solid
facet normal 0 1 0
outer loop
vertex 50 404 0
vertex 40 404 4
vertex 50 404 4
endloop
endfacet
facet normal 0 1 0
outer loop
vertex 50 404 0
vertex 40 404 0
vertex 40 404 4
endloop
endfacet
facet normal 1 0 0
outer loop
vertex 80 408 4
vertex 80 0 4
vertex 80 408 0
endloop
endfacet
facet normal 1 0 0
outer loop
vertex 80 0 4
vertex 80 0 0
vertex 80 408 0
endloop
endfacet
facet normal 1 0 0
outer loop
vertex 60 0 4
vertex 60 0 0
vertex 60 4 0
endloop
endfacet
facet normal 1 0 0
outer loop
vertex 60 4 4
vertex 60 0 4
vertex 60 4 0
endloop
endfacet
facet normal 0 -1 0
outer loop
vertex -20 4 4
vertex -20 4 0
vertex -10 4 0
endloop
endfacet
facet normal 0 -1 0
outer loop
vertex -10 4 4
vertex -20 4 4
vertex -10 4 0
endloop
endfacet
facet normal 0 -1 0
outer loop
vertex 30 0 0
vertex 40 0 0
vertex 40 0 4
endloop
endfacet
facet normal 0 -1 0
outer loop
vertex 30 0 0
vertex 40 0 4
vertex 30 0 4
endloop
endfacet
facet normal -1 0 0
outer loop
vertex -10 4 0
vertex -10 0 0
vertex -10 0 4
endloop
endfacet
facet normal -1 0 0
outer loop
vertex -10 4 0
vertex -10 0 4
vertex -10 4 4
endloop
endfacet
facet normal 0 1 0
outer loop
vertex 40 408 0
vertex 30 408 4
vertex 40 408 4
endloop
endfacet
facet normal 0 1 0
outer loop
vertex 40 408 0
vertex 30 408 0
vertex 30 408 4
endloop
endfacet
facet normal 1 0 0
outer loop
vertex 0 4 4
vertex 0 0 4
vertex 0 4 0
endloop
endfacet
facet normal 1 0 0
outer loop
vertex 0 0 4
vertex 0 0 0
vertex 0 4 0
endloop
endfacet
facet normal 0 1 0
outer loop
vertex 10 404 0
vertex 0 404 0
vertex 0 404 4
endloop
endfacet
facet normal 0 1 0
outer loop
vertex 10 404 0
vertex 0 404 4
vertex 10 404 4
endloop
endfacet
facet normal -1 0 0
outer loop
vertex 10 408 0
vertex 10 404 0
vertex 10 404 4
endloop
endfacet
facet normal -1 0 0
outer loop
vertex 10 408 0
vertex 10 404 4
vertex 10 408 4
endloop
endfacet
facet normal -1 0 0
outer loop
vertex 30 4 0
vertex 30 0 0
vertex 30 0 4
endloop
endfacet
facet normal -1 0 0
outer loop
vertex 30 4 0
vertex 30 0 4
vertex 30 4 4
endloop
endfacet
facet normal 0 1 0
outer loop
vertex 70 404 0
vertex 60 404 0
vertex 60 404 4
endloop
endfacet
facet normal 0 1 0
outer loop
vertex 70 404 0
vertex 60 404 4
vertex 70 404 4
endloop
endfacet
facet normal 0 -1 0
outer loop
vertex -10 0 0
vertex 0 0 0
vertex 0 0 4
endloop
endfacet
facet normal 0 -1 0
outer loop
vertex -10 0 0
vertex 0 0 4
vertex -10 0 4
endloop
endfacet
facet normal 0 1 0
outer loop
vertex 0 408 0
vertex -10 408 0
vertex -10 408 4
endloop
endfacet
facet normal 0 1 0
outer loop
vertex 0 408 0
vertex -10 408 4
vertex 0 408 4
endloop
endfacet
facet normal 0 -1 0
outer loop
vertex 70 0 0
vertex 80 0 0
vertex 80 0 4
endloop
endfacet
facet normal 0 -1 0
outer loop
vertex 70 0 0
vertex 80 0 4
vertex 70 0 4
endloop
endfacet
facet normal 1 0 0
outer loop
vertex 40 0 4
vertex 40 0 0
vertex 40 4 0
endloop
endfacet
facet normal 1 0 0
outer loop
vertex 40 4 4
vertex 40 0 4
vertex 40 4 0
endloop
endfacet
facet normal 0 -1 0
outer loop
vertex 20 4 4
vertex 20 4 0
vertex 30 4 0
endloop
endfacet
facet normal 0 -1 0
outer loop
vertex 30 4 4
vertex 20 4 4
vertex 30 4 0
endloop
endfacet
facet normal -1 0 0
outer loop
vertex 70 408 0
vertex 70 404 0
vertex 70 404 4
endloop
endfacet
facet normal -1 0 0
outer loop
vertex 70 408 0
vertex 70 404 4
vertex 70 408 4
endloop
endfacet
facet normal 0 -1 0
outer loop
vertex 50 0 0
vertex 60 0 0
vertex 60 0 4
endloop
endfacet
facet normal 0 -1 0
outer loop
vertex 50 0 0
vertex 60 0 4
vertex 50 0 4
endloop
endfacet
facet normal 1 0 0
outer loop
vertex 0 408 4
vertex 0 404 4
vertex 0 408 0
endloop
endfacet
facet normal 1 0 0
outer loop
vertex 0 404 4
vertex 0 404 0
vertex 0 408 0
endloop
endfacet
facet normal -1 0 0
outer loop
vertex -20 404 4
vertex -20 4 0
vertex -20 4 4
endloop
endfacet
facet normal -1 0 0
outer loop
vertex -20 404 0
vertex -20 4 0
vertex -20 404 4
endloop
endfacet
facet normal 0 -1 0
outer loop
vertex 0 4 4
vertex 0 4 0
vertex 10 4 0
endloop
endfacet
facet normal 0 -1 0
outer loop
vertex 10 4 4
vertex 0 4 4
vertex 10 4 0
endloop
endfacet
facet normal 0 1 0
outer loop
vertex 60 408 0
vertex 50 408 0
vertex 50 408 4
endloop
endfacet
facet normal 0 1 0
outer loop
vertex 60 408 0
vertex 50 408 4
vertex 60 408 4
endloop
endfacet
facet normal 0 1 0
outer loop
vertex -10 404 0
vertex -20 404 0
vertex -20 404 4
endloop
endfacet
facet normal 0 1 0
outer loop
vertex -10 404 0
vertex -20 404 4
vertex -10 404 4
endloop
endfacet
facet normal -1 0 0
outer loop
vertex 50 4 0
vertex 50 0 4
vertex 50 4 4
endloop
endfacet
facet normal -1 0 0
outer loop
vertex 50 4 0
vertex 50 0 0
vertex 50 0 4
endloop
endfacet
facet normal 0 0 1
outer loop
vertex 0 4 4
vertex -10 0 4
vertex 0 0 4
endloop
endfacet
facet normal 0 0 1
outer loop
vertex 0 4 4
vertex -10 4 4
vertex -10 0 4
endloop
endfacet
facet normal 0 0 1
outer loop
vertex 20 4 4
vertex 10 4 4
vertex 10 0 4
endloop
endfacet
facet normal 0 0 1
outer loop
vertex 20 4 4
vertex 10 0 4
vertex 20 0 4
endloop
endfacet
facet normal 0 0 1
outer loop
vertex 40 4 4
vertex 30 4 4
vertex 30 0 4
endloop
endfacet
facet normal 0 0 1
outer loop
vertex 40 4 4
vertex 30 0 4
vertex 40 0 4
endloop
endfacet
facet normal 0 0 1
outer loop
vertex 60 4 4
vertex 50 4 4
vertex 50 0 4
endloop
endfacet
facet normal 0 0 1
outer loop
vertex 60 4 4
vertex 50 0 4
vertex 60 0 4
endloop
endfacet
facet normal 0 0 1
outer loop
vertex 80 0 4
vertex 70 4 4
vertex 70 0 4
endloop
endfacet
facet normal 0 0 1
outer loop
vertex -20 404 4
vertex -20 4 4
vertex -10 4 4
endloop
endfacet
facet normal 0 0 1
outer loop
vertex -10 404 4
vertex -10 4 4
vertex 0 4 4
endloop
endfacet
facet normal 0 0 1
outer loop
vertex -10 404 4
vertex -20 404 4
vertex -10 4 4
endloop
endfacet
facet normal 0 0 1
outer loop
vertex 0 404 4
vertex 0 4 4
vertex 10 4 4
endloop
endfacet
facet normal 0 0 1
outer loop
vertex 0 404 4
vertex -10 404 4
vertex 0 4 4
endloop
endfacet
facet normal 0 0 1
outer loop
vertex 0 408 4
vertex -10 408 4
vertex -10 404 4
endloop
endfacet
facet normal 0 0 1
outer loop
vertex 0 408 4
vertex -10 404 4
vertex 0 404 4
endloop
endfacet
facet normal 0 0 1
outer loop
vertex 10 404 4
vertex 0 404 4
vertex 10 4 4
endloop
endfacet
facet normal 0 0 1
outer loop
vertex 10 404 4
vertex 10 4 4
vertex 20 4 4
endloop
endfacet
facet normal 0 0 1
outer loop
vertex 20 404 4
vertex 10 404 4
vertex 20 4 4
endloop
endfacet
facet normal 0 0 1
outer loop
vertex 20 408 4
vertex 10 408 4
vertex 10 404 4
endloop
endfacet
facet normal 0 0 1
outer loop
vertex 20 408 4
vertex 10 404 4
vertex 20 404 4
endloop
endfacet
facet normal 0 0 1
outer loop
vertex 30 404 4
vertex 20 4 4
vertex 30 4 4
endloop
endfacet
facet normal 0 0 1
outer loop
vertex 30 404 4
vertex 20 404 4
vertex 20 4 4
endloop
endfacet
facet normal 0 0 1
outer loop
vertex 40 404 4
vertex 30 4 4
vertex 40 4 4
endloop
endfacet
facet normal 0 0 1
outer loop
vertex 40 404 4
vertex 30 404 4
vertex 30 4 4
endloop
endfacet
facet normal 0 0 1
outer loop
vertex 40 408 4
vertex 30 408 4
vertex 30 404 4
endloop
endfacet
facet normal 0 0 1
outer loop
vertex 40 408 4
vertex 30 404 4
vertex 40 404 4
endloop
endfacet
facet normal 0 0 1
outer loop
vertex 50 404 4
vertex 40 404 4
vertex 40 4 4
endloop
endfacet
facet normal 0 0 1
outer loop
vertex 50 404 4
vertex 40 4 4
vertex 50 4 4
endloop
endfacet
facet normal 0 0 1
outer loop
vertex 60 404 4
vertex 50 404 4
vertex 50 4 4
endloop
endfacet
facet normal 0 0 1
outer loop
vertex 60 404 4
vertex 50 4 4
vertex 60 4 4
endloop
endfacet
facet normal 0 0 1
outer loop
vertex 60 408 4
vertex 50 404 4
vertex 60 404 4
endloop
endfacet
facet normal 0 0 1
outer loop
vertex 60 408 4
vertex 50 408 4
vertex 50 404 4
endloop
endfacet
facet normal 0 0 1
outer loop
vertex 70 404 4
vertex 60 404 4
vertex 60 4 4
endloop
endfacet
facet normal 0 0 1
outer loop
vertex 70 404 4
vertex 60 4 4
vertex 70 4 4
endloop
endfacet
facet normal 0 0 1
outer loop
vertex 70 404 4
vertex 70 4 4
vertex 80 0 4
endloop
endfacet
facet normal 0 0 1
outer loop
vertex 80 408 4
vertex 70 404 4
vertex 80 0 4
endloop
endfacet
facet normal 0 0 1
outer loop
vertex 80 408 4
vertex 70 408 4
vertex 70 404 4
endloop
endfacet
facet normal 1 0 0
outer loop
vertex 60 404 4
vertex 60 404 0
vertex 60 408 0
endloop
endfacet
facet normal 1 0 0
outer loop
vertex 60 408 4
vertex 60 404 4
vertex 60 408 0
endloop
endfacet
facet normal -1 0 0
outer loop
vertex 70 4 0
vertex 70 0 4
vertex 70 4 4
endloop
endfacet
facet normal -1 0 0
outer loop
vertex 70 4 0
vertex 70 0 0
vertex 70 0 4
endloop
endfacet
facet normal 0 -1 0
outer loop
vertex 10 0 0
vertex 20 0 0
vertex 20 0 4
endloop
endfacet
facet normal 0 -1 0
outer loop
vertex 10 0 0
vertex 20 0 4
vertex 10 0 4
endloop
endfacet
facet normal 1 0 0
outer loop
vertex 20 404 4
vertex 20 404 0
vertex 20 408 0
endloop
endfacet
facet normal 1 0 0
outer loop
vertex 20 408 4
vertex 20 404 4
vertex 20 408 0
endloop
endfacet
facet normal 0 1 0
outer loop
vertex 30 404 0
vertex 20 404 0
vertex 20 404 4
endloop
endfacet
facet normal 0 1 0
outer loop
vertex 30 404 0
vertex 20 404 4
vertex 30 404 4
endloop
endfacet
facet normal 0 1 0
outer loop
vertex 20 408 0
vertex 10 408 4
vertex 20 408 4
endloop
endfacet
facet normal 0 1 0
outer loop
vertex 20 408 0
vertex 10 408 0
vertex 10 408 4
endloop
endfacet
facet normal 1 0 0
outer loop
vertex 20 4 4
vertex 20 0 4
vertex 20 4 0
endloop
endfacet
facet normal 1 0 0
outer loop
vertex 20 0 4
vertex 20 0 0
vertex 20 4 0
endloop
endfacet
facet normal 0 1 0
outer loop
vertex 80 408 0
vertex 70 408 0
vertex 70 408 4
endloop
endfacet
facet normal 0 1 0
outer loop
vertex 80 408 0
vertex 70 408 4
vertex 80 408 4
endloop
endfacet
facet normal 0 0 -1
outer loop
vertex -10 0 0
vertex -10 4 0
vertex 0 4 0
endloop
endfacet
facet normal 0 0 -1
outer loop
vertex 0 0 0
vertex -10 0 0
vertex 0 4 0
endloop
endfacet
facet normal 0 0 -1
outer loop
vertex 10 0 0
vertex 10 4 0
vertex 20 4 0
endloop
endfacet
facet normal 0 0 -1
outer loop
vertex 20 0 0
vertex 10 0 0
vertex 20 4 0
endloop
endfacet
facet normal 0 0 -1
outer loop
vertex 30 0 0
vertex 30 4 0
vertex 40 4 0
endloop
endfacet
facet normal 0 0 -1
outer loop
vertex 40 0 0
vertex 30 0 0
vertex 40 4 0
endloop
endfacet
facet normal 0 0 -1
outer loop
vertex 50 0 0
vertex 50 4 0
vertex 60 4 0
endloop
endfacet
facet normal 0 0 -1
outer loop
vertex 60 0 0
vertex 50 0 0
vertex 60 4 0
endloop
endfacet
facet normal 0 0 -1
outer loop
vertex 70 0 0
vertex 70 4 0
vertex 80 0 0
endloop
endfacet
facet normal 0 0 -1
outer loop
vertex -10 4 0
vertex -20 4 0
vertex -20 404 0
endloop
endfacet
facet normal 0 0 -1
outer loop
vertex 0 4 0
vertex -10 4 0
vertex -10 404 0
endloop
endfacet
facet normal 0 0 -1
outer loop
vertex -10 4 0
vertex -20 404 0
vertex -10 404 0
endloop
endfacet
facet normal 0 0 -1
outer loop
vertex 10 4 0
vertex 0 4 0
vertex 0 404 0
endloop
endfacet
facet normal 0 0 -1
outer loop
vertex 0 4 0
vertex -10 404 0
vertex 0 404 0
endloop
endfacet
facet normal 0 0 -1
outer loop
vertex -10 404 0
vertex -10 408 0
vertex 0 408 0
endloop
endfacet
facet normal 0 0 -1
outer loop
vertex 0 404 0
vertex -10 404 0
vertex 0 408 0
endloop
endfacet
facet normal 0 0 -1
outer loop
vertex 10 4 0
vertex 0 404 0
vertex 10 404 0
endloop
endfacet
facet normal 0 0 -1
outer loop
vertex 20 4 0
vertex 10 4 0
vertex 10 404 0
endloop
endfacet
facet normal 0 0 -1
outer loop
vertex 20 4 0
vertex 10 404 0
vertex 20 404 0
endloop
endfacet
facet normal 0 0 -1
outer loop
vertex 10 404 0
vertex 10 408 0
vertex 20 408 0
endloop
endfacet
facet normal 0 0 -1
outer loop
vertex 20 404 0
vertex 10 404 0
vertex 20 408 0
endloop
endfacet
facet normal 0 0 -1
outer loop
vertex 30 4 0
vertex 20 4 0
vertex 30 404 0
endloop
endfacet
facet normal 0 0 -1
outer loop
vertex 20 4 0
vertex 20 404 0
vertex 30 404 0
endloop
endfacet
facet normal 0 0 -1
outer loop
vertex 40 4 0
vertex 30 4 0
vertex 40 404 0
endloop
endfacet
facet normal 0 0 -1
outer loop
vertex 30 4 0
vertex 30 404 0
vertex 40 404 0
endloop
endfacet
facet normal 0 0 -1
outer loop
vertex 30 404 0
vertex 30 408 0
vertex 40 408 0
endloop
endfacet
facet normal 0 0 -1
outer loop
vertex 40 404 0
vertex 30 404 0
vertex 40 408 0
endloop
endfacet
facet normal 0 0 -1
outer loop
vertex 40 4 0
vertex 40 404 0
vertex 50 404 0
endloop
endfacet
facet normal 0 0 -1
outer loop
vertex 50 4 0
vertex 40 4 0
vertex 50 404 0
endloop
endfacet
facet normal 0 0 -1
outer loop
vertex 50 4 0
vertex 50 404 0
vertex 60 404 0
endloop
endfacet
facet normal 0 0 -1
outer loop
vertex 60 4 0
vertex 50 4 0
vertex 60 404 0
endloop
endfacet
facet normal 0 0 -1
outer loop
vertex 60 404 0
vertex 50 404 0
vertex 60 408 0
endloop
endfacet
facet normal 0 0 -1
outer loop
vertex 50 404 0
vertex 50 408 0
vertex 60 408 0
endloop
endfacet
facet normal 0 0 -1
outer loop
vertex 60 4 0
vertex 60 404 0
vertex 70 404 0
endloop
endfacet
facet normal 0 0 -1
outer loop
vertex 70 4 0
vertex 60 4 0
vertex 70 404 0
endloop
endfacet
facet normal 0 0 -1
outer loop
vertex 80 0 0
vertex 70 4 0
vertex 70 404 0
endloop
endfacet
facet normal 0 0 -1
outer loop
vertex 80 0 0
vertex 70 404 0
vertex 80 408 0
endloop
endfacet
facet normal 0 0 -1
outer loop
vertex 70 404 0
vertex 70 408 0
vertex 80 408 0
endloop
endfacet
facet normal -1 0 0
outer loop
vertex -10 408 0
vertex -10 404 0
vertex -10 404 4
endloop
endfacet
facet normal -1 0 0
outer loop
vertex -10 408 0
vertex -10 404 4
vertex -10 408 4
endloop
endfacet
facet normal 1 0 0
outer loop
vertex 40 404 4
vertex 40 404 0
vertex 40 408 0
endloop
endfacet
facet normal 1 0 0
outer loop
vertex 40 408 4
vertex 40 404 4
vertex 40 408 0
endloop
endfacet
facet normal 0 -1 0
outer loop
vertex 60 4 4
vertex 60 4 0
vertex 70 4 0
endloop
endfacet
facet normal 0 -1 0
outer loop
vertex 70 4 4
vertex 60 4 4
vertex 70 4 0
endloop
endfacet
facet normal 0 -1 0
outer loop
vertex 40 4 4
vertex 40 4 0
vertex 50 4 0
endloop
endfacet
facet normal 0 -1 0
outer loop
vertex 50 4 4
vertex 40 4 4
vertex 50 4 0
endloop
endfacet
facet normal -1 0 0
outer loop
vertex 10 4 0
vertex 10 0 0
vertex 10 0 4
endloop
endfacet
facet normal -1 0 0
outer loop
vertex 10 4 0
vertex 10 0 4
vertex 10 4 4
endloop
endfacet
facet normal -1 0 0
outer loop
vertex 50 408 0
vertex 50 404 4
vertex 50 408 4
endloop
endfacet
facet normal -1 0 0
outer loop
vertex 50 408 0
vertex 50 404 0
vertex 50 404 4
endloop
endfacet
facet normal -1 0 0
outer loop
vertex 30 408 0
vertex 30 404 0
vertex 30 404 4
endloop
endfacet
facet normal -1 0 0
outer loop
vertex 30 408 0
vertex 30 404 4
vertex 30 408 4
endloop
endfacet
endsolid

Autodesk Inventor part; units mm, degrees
ref_plane "YZ Plane" through (0, 0, 0) normal (1, 0, 0) x (0, 1, 0)
ref_plane "XZ Plane" through (0, 0, 0) normal (0, 1, 0) x (-1, 0, 0)
ref_plane "XY Plane" through (0, 0, 0) normal (0, 0, 1) x (1, 0, 0)
sketch "Эскиз1" plane through (0, 0, 0) normal (0, 0, 1) x (1, 0, 0)
  line L0 (0, 0) -> (-10, 0) projected
  line L1 (0, 0) -> (0, 4) projected
  line L2 (-10, 4) -> (0, 4) projected
  line L3 (-10, 0) -> (-10, 4) projected
  line L4 (20, 0) -> (10, 0) projected
  line L5 (20, 0) -> (20, 4) projected
  line L6 (10, 4) -> (20, 4) projected
  line L7 (10, 0) -> (10, 4) projected
  line L8 (-20, 4) -> (-10, 4) projected
  line L9 (0, 4) -> (10, 4) projected
  line L10 (40, 0) -> (30, 0) projected
  line L11 (40, 0) -> (40, 4) projected
  line L12 (30, 4) -> (40, 4) projected
  line L13 (30, 0) -> (30, 4) projected
  line L14 (20, 4) -> (30, 4) projected
  line L15 (40, 4) -> (50, 4) projected
  line L16 (60, 0) -> (50, 0) projected
  line L17 (60, 0) -> (60, 4) projected
  line L18 (50, 4) -> (60, 4) projected
  line L19 (50, 0) -> (50, 4) projected
  line L20 (60, 4) -> (70, 4) projected
  line L21 (80, 0) -> (70, 0) projected
  line L22 (80, 4) -> (80, 0) projected
  line L23 (70, 4) -> (80, 4) projected
  line L24 (70, 0) -> (70, 4) projected
  line L25 (-20, 404) -> (-10, 404) projected
  line L26 (0, 404) -> (10, 404) projected
  line L27 (20, 404) -> (30, 404) projected
  line L28 (40, 404) -> (50, 404) projected
  line L29 (60, 404) -> (70, 404) projected
  line L30 (80, 404) -> (70, 404) projected
  line L31 (80, 408) -> (80, 404) projected
  line L32 (70, 408) -> (80, 408) projected
  line L33 (70, 404) -> (70, 408) projected
  line L34 (60, 404) -> (50, 404) projected
  line L35 (60, 404) -> (60, 408) projected
  line L36 (50, 408) -> (60, 408) projected
  line L37 (50, 404) -> (50, 408) projected
  line L38 (40, 404) -> (30, 404) projected
  line L39 (40, 404) -> (40, 408) projected
  line L40 (30, 408) -> (40, 408) projected
  line L41 (30, 404) -> (30, 408) projected
  line L42 (10, 408) -> (20, 408) projected
  line L43 (20, 404) -> (10, 404) projected
  line L44 (20, 404) -> (20, 408) projected
  line L45 (10, 408) -> (20, 408) projected
  line L46 (10, 404) -> (10, 408) projected
  line L47 (0, 404) -> (-10, 404) projected
  line L48 (0, 404) -> (0, 408) projected
  line L49 (-10, 408) -> (0, 408) projected
  line L50 (-10, 404) -> (-10, 408) projected
  line L51 (80, 4) -> (80, 404)
  line L52 (-20, 4) -> (-20, 404)
extrude "Выдавливание1" add sketch "Эскиз1" along normal blind 4
properties part number "низ"
